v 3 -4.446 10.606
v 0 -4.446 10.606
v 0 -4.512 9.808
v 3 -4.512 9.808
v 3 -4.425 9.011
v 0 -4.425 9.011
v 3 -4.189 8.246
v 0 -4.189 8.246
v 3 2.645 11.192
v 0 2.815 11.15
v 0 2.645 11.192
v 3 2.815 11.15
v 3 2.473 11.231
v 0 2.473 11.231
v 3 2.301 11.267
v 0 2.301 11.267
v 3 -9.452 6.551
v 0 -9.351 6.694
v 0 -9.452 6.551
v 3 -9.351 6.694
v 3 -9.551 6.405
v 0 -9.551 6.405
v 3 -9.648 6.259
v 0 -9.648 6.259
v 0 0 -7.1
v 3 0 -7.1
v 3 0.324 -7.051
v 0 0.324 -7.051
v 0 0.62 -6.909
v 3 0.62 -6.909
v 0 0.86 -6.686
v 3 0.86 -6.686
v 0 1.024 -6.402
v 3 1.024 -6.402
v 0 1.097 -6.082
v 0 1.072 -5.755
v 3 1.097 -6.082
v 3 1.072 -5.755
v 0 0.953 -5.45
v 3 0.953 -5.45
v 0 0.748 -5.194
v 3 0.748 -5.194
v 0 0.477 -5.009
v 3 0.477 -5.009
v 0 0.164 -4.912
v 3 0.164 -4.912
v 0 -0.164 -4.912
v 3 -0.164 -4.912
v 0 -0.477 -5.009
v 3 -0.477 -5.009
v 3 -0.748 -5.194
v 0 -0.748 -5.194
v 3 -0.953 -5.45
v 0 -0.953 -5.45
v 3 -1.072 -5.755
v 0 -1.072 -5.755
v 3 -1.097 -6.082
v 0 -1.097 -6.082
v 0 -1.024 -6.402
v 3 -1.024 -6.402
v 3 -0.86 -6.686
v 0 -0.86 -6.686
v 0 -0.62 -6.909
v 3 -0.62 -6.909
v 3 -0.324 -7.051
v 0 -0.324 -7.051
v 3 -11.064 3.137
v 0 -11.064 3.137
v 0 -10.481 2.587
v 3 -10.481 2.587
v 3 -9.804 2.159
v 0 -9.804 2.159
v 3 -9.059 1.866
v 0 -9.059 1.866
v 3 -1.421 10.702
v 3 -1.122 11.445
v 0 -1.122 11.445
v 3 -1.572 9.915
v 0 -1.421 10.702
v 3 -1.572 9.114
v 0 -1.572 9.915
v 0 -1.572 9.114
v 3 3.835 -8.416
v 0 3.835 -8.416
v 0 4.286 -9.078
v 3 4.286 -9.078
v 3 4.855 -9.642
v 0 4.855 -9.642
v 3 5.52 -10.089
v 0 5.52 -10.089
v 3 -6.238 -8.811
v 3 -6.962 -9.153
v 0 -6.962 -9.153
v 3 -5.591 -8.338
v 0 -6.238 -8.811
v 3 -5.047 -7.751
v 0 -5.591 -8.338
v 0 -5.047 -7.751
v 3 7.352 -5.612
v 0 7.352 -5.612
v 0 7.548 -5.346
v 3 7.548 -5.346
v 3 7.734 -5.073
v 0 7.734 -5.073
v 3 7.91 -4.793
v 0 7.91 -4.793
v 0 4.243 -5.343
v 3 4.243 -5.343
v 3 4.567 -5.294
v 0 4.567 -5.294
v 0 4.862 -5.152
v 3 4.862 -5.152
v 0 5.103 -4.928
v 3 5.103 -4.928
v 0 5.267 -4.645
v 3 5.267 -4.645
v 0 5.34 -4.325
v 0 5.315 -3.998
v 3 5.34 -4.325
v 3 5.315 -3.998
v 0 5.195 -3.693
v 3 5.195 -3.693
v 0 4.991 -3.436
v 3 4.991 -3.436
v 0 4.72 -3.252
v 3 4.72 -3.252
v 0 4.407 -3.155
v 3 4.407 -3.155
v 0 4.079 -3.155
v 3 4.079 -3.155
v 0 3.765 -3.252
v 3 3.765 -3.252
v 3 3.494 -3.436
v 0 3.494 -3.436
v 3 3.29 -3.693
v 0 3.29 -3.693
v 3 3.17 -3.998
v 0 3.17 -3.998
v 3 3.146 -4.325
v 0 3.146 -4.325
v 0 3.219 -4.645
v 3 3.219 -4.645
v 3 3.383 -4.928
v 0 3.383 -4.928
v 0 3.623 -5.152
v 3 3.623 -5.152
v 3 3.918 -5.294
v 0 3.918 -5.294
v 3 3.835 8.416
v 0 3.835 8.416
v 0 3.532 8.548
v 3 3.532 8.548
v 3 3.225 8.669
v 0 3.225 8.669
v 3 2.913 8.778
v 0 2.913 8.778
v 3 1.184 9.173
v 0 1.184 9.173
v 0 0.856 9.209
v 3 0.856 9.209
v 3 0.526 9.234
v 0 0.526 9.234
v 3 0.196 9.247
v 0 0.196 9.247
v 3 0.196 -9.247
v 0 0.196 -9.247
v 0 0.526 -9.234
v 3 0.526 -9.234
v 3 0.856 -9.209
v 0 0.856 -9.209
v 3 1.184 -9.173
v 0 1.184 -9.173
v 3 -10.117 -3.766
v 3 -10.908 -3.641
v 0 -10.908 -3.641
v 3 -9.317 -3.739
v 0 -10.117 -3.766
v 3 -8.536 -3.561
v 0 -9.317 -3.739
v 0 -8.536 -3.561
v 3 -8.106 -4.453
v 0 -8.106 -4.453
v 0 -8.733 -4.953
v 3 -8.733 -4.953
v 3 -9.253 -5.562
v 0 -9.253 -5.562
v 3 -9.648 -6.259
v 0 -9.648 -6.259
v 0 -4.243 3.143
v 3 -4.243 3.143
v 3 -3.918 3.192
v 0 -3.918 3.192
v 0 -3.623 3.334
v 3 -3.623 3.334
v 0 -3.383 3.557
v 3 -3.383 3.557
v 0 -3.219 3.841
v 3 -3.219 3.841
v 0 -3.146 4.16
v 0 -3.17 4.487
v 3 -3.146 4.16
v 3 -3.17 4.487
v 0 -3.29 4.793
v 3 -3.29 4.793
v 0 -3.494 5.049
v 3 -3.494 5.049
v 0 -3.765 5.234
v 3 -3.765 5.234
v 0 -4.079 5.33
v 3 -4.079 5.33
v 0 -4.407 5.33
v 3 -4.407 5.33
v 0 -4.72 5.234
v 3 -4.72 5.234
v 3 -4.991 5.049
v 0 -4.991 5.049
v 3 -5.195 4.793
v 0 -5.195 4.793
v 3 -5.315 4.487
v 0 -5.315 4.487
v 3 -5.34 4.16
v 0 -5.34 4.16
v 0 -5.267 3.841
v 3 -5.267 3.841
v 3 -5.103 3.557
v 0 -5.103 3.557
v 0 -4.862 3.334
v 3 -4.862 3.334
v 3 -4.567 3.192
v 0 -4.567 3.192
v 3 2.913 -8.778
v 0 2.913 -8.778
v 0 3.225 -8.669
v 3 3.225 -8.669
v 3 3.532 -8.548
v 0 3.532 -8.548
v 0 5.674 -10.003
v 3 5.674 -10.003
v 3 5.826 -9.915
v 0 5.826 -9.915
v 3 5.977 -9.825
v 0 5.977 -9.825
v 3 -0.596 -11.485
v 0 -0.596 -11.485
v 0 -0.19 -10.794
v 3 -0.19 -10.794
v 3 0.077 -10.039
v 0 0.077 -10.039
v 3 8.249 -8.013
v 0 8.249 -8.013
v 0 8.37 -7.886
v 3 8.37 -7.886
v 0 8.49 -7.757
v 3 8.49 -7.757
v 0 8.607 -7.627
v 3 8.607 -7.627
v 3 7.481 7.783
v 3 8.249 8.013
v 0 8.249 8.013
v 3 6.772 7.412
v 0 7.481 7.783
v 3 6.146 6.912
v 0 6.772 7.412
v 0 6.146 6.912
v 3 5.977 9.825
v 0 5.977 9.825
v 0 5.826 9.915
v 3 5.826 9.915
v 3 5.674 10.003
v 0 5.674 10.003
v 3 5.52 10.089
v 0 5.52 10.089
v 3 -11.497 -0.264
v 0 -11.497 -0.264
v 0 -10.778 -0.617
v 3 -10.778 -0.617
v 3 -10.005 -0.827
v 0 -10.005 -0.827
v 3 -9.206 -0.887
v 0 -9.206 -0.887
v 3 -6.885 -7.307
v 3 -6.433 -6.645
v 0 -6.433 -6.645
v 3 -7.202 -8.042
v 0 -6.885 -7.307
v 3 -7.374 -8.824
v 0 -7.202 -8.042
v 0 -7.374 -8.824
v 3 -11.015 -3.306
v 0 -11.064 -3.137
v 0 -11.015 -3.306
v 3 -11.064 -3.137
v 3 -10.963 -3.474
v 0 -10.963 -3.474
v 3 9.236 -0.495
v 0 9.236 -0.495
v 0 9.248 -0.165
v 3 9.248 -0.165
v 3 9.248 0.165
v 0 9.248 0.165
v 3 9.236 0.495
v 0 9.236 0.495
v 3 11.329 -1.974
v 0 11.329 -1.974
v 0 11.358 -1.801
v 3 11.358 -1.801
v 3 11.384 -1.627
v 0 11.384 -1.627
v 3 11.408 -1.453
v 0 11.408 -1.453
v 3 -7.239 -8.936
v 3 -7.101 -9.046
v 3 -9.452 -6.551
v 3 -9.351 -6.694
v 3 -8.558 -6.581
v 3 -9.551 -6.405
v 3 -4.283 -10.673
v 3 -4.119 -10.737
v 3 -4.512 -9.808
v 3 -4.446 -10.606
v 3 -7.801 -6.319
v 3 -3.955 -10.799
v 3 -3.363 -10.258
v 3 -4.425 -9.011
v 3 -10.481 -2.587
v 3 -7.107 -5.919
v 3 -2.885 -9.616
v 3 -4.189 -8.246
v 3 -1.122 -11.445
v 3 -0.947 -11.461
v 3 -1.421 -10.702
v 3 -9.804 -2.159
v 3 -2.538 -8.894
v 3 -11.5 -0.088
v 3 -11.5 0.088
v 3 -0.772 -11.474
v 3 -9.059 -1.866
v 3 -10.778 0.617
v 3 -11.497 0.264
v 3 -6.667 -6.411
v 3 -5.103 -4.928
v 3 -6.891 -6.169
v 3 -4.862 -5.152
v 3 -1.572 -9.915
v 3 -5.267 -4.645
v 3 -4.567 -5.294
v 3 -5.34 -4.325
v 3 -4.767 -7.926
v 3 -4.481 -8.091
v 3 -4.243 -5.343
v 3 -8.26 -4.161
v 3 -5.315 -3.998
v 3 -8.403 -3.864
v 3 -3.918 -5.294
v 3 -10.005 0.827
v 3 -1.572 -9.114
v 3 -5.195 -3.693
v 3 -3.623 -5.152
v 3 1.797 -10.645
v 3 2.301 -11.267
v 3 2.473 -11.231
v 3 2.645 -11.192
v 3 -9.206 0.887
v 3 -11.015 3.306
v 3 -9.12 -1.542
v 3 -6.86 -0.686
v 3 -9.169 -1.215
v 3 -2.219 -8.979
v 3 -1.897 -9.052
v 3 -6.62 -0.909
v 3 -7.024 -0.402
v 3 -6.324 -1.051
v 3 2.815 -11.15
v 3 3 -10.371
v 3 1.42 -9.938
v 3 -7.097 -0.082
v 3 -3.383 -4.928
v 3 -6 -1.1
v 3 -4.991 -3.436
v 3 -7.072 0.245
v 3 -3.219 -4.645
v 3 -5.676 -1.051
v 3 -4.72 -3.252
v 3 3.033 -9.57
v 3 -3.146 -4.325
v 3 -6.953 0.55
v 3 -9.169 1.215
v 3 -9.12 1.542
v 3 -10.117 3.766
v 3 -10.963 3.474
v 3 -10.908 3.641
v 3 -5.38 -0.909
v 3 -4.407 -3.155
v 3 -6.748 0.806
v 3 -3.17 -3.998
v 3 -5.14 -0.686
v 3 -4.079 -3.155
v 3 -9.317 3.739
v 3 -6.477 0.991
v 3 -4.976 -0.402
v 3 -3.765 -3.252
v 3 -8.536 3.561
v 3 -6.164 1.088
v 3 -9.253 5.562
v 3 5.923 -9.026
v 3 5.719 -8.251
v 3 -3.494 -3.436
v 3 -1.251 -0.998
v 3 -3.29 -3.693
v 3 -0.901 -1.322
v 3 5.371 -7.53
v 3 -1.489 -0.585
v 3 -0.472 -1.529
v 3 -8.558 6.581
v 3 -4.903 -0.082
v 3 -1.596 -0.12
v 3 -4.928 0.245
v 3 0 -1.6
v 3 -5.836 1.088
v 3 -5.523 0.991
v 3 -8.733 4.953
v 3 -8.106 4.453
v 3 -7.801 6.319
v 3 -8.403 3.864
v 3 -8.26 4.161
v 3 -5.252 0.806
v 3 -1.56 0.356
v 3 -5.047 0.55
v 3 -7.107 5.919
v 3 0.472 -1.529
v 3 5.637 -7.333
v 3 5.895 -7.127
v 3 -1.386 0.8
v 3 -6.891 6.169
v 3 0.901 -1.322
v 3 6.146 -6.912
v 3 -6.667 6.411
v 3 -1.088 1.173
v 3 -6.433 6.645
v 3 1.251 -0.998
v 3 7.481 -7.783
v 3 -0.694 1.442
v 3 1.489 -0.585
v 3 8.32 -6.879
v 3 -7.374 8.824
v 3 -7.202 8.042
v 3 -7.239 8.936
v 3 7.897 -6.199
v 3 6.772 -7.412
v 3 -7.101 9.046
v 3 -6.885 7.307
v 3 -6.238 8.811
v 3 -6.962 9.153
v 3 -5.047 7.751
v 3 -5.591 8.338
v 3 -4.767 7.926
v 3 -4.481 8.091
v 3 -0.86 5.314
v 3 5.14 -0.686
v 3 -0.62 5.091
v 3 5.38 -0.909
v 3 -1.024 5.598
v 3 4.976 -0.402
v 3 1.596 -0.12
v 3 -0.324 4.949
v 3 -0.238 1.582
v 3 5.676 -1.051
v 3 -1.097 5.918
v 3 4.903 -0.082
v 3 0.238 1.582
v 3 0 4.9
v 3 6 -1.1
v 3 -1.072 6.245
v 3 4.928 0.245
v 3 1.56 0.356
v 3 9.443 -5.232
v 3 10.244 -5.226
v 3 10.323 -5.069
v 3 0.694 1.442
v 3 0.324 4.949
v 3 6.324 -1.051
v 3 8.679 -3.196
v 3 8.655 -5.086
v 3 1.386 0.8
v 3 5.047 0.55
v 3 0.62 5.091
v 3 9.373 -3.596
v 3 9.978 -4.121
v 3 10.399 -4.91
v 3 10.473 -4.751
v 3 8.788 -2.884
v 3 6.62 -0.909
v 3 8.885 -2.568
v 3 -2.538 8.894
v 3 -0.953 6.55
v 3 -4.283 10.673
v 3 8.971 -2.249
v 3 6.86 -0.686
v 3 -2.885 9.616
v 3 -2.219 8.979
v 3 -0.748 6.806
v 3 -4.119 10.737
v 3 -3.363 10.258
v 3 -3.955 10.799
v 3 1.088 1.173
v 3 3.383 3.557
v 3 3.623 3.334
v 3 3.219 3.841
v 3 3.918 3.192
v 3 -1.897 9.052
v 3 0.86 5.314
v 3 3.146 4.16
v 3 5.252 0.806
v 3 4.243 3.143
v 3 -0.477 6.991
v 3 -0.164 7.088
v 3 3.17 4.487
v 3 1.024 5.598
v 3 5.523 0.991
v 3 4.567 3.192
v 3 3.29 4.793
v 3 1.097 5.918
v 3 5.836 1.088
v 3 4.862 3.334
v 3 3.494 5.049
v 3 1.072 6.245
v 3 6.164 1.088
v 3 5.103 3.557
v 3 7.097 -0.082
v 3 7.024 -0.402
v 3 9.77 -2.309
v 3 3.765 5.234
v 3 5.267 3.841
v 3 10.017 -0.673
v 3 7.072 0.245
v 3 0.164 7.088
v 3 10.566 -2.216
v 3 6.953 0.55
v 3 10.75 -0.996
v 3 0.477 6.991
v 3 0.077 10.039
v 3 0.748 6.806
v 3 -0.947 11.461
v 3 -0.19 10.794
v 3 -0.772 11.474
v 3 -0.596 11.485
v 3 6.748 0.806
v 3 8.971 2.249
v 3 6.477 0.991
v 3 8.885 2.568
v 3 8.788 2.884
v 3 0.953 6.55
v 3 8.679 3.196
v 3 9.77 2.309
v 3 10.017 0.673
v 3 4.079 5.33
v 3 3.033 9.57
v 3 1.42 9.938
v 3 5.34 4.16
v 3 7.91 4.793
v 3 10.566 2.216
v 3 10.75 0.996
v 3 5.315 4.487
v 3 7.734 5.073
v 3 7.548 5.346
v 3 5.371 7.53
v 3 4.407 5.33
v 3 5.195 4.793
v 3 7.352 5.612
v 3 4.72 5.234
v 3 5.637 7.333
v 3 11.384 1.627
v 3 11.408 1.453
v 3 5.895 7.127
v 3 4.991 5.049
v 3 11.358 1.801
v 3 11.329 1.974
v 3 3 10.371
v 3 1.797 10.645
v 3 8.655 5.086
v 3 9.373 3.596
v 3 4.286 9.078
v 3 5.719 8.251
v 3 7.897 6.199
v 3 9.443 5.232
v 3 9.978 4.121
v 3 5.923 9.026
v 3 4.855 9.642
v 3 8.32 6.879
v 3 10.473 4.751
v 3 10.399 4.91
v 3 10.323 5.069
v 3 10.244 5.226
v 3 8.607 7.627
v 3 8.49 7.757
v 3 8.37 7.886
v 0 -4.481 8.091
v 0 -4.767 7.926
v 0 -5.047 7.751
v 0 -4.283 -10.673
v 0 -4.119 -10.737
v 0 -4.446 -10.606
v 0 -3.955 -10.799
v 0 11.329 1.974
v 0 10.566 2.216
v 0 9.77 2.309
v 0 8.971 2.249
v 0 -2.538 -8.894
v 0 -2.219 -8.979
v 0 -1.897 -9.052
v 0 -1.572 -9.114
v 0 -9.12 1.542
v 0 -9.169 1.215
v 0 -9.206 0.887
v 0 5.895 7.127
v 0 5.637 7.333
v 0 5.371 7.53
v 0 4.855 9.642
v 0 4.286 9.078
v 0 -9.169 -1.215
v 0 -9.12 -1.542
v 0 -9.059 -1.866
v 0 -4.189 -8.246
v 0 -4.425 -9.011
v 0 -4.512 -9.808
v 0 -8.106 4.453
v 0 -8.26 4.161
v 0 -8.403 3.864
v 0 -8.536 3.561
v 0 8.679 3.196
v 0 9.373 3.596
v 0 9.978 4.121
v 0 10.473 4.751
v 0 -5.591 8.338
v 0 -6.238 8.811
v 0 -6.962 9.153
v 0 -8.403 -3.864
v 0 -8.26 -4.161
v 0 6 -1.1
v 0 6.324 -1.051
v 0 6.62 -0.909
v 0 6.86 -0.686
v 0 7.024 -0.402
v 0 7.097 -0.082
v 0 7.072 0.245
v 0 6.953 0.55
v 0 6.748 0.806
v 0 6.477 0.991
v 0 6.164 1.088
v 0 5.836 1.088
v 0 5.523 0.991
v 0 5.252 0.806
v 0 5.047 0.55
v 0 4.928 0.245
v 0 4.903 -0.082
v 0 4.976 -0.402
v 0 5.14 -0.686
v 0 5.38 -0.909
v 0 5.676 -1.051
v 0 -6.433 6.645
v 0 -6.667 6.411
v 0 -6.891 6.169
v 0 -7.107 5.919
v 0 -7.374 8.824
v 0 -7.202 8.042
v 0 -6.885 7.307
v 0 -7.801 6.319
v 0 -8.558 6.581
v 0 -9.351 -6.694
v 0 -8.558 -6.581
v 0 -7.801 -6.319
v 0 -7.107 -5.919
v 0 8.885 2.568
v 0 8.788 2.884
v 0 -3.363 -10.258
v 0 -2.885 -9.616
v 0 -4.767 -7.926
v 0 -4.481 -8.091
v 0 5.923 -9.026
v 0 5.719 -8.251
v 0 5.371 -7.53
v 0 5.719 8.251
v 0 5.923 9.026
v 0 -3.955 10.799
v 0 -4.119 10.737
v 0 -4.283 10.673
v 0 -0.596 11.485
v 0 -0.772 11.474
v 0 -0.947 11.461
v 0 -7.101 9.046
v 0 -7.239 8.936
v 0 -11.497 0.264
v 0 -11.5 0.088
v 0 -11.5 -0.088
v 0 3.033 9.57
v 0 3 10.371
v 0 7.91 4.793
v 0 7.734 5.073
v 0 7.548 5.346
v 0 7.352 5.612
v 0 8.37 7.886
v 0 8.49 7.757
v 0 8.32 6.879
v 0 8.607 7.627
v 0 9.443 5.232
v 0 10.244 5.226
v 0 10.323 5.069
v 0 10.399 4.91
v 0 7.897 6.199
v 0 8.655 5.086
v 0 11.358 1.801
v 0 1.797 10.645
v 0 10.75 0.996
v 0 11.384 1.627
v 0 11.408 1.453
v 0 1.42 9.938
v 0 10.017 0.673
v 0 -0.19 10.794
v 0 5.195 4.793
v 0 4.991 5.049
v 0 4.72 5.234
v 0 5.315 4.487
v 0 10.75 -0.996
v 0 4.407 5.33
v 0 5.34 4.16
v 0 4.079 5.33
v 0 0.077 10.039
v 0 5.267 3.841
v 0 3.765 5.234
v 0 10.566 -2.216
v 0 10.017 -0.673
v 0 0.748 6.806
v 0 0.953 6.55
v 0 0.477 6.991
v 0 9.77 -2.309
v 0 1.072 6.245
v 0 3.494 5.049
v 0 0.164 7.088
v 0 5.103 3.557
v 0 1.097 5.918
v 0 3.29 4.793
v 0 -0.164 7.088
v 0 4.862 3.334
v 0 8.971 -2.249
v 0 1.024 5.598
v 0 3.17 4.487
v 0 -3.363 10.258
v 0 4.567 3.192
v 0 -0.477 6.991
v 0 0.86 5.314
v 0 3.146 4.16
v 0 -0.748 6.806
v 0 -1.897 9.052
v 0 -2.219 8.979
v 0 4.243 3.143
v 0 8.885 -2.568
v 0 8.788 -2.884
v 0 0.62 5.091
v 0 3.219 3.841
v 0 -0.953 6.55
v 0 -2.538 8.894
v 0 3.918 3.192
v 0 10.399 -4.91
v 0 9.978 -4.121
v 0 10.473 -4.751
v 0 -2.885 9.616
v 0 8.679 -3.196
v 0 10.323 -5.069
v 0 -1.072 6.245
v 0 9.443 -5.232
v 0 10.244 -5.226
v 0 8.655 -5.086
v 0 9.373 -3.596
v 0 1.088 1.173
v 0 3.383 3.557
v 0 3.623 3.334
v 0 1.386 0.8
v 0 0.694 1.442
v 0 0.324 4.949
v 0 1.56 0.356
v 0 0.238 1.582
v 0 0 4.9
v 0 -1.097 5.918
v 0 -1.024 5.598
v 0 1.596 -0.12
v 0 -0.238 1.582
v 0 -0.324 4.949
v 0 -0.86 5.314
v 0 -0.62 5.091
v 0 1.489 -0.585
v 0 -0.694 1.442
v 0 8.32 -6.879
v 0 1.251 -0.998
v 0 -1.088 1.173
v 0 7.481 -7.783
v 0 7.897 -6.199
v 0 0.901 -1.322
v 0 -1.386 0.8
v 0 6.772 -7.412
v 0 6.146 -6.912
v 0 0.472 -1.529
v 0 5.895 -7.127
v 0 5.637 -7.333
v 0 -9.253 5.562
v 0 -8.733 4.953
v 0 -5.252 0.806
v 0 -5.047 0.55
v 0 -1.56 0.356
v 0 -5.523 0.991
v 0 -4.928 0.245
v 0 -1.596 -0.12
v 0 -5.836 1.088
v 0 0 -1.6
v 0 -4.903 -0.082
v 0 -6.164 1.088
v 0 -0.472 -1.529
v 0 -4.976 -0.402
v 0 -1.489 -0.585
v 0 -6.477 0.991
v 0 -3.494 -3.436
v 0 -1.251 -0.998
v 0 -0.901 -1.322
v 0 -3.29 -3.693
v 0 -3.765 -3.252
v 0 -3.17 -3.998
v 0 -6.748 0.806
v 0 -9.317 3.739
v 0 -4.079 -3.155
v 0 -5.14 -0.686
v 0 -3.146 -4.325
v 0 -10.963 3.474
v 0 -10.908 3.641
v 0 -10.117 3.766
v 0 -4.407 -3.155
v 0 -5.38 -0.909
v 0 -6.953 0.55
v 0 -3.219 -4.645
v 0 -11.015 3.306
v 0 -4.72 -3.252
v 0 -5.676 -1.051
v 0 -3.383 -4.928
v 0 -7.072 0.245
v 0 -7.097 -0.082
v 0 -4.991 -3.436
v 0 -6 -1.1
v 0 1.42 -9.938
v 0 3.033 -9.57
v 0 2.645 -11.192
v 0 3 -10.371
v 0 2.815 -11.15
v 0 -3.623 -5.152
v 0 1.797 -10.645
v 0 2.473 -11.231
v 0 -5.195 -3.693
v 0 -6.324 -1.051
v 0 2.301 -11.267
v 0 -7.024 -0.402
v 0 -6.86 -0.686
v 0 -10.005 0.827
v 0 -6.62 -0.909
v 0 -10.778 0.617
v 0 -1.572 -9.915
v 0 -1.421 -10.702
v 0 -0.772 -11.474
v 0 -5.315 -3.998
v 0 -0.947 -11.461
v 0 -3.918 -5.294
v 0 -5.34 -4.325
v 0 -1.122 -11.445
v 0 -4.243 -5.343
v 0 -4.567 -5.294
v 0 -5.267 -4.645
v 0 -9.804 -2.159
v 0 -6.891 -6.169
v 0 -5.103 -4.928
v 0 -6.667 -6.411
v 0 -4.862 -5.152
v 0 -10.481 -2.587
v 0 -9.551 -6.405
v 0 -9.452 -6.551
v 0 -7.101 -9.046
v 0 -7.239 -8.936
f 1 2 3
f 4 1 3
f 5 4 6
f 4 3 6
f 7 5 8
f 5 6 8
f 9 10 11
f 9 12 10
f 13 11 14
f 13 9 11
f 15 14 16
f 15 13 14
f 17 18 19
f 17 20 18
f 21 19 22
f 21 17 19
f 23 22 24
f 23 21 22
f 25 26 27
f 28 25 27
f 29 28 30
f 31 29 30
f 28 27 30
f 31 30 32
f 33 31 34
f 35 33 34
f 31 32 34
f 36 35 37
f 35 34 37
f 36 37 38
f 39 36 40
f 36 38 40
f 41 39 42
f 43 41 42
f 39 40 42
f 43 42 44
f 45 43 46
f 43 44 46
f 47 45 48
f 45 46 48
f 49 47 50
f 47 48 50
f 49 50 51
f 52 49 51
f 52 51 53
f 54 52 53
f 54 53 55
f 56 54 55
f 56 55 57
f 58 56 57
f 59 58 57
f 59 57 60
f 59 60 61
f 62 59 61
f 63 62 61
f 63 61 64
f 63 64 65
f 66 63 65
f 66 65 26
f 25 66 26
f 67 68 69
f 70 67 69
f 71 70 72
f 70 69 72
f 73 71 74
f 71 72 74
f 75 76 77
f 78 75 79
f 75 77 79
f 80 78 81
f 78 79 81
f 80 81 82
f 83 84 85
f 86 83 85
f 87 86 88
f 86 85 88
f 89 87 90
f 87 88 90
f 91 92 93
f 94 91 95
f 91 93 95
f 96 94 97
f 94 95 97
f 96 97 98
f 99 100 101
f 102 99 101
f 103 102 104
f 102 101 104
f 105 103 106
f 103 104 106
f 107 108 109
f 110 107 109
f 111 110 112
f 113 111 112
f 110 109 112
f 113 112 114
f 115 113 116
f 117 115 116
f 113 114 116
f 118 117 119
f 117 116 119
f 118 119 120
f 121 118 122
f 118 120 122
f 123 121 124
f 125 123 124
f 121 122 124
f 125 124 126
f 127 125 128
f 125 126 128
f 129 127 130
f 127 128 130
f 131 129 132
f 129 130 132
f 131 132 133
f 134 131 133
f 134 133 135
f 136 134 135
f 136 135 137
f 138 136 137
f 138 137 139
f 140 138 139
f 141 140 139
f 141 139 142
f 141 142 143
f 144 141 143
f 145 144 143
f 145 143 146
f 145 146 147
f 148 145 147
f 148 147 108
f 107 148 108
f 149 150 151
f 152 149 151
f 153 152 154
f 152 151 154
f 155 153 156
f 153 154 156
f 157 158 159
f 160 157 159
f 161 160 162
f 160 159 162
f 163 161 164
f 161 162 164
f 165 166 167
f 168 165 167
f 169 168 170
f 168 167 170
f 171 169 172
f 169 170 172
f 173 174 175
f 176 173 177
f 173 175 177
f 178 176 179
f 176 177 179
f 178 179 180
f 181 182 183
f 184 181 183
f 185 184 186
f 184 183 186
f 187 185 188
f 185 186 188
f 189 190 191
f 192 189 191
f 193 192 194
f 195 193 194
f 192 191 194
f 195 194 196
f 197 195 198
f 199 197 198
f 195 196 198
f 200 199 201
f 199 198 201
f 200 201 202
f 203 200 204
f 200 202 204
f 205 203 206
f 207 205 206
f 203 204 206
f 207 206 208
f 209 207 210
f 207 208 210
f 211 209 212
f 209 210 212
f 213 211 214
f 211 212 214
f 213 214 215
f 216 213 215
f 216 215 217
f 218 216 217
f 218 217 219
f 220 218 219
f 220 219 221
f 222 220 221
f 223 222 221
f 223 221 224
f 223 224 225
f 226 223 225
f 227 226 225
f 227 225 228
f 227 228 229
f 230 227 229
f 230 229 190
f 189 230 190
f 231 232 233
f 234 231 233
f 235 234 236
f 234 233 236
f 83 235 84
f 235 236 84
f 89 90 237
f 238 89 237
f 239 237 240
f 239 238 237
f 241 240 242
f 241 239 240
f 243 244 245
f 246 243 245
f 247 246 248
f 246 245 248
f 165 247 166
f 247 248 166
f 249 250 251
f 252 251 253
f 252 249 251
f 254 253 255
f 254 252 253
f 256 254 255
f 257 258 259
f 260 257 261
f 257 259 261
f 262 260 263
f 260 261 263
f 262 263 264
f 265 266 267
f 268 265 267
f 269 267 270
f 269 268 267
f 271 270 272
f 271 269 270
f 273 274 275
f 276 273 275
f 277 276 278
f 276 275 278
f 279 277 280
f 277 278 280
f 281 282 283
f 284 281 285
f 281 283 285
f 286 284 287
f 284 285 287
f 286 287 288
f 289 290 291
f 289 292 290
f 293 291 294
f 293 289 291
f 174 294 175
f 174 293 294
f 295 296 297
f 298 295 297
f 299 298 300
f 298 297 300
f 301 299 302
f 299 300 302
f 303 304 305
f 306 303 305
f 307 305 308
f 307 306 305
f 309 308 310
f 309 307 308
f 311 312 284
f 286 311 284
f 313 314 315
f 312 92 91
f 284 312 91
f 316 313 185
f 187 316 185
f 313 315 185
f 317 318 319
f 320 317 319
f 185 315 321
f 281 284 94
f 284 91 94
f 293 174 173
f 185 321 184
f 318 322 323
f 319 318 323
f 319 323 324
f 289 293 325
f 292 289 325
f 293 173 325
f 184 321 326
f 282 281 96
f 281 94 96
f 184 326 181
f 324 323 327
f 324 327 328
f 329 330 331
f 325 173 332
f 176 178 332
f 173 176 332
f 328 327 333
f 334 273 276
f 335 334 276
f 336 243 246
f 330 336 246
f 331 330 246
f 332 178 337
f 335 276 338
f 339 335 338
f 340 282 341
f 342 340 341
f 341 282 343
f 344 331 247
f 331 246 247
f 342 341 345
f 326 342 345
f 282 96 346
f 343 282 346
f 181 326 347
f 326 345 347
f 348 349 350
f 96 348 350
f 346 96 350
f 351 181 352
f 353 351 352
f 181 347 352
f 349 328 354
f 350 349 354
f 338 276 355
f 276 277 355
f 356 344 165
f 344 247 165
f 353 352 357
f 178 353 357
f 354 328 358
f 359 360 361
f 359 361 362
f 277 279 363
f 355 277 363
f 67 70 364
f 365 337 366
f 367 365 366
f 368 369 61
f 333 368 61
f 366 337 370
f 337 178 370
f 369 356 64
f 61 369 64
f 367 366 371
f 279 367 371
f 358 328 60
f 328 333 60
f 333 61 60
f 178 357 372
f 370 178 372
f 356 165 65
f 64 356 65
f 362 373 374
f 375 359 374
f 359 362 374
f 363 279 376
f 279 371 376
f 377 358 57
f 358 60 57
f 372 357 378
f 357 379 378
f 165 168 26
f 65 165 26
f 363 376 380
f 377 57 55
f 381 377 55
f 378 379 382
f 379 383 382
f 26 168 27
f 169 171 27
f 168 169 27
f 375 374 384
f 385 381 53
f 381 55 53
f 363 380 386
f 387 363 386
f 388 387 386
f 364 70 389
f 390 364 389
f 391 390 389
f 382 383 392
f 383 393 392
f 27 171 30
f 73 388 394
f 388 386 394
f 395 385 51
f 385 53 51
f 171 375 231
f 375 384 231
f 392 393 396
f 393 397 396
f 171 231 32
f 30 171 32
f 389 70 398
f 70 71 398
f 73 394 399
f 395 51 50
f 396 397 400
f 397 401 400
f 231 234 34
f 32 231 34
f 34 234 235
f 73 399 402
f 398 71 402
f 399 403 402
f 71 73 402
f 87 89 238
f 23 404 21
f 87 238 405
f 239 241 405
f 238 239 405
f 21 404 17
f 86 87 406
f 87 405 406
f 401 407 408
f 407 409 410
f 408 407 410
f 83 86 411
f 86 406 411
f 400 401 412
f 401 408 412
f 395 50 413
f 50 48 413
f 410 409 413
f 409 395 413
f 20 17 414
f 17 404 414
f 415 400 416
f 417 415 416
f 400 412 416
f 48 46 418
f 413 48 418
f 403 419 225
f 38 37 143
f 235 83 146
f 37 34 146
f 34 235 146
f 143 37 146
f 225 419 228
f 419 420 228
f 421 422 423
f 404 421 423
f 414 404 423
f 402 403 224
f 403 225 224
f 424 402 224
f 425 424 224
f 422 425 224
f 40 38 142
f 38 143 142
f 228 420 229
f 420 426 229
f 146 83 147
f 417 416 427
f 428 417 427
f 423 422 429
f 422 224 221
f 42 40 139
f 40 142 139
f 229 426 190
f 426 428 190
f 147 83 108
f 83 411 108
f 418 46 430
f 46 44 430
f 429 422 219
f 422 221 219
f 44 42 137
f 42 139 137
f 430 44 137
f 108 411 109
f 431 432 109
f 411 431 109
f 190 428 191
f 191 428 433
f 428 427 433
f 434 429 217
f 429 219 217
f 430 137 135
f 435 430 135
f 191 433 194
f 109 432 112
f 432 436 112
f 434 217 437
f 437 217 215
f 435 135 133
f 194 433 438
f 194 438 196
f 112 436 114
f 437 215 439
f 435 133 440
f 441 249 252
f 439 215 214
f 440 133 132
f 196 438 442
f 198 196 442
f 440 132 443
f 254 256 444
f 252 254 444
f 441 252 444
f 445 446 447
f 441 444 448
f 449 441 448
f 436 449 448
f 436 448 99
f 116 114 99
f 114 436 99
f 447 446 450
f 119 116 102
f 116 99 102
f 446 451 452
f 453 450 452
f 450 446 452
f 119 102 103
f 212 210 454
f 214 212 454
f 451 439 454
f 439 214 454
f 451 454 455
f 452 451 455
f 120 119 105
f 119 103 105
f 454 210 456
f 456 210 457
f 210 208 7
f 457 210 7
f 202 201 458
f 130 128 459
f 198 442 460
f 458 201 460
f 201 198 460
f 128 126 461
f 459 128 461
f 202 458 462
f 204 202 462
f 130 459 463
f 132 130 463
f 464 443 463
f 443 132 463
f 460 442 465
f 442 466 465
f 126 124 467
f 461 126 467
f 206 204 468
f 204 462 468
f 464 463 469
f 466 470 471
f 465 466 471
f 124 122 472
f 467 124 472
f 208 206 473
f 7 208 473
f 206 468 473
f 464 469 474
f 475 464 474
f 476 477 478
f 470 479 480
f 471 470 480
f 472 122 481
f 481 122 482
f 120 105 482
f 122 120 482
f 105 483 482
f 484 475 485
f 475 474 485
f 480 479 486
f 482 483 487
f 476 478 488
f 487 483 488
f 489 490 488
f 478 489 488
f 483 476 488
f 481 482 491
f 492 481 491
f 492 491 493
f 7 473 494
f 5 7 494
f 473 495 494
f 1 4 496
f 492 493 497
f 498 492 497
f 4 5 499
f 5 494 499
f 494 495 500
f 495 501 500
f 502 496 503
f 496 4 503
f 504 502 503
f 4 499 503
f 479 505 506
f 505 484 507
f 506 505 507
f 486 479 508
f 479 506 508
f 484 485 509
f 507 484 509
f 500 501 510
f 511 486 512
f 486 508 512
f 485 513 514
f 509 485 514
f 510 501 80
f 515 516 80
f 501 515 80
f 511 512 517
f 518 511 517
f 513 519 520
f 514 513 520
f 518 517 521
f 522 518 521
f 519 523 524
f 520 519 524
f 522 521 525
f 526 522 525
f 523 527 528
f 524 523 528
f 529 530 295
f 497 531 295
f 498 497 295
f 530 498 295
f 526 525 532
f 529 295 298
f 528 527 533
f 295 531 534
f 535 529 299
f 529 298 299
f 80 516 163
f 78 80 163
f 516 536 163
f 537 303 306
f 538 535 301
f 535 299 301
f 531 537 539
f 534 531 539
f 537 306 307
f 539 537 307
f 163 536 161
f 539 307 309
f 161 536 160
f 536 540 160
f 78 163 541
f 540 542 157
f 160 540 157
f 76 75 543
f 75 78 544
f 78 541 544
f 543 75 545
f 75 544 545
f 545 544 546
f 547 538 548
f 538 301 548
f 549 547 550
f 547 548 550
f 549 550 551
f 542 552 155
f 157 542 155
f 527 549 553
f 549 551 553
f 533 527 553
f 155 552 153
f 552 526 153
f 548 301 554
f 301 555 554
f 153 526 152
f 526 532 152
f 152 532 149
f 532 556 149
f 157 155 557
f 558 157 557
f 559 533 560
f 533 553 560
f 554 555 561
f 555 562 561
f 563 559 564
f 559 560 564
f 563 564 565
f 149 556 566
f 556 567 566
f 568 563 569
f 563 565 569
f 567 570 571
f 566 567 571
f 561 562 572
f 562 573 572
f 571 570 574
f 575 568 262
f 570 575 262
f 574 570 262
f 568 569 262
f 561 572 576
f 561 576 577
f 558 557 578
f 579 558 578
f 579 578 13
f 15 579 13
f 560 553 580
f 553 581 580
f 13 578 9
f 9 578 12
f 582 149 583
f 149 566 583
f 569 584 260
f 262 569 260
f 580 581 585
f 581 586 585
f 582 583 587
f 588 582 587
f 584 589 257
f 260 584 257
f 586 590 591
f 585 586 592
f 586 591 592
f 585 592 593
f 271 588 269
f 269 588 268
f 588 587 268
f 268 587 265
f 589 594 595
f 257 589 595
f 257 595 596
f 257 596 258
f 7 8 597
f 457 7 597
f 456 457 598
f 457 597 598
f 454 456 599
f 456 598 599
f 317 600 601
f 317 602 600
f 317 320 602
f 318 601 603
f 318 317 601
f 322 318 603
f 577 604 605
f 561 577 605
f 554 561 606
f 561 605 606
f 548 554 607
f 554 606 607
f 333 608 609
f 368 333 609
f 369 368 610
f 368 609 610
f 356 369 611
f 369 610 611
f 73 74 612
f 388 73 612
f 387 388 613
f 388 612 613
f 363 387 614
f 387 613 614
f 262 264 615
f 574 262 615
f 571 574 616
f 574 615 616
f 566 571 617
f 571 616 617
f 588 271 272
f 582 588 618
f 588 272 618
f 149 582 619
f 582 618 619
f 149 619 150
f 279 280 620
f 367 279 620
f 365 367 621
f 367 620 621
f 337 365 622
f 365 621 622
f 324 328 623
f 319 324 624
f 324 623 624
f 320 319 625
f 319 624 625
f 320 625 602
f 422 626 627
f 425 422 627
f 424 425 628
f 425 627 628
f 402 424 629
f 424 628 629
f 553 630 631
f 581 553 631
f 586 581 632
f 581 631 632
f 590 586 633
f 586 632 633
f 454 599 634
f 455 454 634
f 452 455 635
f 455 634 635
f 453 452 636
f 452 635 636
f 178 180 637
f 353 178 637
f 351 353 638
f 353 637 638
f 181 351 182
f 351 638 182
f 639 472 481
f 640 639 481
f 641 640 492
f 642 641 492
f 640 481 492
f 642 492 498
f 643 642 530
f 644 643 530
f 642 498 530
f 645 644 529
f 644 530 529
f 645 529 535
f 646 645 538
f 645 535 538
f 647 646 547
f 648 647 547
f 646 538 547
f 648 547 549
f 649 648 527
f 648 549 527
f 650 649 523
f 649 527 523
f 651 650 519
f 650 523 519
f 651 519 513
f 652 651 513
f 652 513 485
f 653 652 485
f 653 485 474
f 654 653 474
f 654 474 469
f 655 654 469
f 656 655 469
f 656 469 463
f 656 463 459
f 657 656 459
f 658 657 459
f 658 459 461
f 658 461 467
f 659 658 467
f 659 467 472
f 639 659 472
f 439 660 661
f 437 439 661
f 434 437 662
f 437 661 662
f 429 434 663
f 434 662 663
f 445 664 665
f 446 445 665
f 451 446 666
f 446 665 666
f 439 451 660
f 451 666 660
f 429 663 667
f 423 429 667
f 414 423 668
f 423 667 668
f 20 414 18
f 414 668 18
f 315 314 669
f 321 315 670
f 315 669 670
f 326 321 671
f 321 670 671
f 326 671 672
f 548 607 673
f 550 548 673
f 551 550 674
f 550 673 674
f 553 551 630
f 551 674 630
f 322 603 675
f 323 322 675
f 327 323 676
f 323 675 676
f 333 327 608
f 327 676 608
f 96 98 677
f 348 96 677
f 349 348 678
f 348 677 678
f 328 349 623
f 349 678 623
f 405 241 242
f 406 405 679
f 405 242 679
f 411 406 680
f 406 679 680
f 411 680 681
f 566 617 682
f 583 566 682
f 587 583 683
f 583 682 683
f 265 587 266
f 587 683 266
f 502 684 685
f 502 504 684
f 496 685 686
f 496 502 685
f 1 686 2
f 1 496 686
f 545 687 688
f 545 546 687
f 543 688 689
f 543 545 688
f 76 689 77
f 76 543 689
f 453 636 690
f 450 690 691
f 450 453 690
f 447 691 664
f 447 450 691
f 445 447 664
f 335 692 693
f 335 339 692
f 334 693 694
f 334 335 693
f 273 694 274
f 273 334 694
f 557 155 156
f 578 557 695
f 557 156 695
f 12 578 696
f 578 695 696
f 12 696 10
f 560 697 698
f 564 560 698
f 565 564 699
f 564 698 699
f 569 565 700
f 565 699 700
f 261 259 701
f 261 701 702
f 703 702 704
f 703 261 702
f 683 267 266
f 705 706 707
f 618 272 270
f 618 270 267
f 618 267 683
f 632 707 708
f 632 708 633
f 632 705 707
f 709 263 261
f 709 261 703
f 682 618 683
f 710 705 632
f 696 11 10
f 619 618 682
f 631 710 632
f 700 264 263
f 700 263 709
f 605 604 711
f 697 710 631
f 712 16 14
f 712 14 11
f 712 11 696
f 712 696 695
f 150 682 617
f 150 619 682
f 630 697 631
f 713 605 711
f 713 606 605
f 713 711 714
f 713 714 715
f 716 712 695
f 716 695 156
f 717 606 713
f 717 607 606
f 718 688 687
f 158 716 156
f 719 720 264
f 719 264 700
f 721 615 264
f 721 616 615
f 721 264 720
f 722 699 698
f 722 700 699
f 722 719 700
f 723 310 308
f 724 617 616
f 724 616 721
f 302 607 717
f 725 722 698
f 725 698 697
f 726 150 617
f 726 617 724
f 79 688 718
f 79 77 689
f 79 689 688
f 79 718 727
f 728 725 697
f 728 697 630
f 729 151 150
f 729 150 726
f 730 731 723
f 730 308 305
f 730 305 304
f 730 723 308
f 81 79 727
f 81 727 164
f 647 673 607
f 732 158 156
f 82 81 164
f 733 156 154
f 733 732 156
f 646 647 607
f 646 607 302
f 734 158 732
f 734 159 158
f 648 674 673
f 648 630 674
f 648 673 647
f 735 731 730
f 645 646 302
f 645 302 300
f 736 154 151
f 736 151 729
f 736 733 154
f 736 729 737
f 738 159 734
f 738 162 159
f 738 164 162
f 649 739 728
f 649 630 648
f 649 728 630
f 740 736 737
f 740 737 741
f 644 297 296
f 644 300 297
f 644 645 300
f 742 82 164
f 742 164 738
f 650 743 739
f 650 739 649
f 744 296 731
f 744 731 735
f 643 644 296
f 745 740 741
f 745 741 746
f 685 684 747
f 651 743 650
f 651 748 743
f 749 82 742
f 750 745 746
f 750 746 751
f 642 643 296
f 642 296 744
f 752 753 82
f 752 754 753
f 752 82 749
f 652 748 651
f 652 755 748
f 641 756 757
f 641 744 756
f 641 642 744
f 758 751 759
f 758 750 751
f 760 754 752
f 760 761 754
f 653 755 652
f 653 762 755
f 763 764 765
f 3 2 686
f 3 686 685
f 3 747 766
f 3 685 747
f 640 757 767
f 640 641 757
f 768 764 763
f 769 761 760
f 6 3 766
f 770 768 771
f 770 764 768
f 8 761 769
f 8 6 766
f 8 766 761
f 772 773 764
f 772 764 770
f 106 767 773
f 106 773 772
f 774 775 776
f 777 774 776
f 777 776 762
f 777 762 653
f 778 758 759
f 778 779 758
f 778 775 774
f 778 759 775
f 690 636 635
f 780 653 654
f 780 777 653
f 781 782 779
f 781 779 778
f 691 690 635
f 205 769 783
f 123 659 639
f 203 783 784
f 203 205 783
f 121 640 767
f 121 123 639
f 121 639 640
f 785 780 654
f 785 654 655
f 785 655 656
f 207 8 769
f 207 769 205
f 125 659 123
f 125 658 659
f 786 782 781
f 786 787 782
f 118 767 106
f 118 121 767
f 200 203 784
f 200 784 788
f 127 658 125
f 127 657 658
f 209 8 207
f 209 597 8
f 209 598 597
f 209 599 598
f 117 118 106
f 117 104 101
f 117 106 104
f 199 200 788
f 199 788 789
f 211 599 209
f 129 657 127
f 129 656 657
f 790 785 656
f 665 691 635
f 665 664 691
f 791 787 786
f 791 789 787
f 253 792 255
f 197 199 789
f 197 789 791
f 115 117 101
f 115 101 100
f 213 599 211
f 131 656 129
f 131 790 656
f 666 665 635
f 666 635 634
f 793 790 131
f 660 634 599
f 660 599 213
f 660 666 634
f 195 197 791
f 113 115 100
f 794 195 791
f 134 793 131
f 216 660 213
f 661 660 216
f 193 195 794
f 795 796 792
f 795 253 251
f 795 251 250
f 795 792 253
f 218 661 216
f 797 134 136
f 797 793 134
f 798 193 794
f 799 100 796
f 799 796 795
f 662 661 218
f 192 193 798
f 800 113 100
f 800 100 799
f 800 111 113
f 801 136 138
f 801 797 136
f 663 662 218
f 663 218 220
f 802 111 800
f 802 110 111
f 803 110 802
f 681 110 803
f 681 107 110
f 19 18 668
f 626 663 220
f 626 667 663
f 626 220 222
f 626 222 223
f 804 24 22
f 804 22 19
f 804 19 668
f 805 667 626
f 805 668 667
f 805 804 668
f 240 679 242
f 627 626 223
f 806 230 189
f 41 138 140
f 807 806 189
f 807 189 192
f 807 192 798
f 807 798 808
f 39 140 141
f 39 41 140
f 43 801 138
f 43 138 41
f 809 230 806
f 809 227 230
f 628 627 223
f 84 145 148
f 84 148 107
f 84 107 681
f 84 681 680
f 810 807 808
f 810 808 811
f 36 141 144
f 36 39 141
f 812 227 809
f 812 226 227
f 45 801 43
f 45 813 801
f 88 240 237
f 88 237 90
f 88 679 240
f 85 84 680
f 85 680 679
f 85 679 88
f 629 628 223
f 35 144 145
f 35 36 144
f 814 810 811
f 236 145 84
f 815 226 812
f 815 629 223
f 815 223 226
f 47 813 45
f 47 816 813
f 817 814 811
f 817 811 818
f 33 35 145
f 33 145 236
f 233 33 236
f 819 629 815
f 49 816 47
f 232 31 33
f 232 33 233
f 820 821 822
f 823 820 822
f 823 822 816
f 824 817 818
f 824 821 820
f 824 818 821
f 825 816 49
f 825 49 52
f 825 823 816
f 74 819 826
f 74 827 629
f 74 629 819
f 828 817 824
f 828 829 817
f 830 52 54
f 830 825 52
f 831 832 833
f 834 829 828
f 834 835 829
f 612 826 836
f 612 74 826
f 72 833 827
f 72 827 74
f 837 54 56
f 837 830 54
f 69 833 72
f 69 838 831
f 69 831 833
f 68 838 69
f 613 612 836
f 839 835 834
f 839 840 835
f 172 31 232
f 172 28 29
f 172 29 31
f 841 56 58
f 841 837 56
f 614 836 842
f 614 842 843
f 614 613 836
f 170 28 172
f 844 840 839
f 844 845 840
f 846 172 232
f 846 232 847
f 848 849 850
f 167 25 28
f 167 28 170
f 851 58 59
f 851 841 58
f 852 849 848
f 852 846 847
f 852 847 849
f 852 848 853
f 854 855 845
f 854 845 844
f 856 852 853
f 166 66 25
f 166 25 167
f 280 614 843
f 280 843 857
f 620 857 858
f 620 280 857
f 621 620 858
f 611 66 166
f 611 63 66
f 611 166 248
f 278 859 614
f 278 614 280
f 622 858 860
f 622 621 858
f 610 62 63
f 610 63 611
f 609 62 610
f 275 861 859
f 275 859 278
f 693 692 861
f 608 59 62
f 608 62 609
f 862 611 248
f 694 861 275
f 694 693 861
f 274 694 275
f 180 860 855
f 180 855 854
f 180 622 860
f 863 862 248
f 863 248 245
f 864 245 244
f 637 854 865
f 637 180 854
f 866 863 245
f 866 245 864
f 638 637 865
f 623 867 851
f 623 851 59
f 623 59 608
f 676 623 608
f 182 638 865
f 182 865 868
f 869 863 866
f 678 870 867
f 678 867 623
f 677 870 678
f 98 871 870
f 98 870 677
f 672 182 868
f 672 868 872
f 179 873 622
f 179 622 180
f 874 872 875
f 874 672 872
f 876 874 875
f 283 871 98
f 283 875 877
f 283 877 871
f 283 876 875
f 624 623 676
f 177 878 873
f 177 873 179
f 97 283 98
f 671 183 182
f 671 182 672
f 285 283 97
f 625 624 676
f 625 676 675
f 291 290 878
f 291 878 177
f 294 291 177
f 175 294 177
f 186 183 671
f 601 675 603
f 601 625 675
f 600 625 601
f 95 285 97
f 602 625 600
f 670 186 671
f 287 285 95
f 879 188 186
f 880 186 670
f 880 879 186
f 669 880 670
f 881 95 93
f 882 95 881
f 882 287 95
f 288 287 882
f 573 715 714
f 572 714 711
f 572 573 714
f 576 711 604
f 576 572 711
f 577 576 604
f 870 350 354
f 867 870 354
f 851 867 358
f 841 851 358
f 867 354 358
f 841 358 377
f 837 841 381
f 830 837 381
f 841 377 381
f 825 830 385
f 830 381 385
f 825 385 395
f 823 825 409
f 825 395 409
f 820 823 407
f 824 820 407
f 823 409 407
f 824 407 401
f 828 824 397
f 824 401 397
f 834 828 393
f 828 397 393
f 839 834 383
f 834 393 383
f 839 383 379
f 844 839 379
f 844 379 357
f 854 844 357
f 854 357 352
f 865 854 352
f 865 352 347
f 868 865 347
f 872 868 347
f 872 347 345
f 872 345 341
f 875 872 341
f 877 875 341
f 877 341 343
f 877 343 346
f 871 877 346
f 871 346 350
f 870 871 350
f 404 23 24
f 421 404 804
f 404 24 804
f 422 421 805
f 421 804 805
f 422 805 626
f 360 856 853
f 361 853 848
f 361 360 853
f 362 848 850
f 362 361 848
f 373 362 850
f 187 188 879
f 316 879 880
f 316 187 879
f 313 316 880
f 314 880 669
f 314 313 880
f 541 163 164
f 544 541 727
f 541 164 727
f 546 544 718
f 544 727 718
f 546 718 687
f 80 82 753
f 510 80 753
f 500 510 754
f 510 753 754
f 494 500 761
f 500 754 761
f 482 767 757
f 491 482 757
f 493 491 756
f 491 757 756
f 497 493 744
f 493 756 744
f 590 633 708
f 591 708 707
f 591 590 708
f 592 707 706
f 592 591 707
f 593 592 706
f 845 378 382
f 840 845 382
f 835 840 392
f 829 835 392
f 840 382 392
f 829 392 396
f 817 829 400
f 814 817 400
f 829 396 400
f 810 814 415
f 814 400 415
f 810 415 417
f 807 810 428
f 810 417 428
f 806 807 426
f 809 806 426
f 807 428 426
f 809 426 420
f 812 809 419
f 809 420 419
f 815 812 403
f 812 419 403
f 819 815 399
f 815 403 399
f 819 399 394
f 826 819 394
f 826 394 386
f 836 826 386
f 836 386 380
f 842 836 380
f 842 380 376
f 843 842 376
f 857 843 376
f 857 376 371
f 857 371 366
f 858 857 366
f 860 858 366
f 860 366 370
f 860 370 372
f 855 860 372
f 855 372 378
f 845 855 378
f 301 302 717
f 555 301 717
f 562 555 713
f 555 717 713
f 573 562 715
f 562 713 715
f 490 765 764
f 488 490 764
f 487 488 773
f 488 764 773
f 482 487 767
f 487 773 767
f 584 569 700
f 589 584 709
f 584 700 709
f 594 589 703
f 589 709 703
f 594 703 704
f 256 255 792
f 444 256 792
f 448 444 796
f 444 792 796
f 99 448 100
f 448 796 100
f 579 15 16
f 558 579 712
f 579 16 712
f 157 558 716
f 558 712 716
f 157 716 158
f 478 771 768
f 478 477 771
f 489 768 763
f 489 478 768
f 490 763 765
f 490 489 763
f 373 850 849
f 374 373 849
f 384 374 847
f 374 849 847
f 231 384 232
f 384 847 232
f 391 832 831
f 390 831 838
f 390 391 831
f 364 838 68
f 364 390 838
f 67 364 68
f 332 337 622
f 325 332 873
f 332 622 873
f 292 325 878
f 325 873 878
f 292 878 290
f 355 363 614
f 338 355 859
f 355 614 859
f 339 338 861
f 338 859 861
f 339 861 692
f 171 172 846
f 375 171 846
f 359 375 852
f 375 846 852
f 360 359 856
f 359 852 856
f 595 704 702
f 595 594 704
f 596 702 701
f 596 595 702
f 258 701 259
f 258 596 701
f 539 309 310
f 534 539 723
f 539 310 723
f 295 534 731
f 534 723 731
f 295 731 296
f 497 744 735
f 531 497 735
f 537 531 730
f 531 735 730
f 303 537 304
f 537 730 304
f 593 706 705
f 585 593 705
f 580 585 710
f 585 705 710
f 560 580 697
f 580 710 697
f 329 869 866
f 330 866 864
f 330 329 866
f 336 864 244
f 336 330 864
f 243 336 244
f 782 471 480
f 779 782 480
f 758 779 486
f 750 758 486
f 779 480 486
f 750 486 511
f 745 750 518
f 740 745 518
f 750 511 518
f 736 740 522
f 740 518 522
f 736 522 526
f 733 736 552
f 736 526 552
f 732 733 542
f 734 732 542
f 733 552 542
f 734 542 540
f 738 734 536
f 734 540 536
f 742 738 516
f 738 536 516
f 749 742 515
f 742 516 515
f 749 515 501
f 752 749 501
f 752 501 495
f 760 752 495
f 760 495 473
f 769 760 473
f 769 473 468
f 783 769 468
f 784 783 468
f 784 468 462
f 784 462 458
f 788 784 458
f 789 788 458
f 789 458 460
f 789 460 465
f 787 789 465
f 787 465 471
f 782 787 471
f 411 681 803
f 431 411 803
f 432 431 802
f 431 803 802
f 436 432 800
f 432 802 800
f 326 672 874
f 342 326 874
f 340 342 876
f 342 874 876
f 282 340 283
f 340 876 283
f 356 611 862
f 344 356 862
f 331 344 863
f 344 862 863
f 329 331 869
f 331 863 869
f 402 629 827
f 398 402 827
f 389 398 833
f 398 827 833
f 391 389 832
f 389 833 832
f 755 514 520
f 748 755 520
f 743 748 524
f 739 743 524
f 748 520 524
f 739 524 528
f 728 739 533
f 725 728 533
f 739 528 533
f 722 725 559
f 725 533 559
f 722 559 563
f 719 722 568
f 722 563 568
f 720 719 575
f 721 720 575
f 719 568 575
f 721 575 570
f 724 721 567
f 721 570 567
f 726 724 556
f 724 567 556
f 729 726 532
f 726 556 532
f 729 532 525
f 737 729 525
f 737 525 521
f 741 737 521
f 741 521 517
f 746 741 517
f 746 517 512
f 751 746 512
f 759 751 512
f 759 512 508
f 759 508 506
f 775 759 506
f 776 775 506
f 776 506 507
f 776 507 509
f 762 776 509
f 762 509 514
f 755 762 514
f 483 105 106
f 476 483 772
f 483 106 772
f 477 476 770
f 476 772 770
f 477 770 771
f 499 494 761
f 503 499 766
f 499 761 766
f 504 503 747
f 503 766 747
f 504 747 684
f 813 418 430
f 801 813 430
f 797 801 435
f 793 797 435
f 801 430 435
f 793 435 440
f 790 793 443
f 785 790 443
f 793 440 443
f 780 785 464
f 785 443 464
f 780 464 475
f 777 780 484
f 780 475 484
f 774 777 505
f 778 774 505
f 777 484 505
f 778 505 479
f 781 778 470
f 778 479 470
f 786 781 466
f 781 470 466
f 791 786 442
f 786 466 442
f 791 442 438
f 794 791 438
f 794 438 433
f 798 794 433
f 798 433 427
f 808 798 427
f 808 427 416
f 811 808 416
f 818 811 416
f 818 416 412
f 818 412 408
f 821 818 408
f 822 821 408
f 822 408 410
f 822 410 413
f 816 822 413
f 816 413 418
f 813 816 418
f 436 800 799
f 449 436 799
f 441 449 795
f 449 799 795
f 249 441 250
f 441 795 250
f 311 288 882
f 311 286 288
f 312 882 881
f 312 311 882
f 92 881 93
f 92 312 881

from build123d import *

# Parameters (mm, degrees)
BASPROSKE_W         = 3
BASPROSKE_H         = 11.5
TOOTHCUT_DEPTH      = 17.537835409
TEETHCUTS_COUNT     = 21
TEETHCUTS_ANGLE     = 342.857142857
BORSKE_R            = 4
BORE_DEPTH          = 50.0000508
EXTRUDE_START       = -3
SKETCH_1_R          = 4
EXTRUDE_1_DEPTH     = 3
SKETCH_2_R          = 1.6
SKETCH_2_R_2        = 1.1
CUT_EXTRUDE_1_DEPTH = 17.52708436


with BuildPart() as part:
    # BasProSke → Base-Revolve (revolve)
    with BuildSketch(Plane(origin=(0, 0, 0), x_dir=(1, 0, 0), z_dir=(0, 1, 0)), mode=Mode.PRIVATE) as base_revolve_sk:
        with Locations((1.5, 5.75)):
            Rectangle(BASPROSKE_W, BASPROSKE_H)
    revolve(base_revolve_sk.sketch.rotate(Axis((-10, 0, 0), (1, 0, 0)), 180), axis=Axis((-10, 0, 0), (1, 0, 0)))

    # TooCutSke → ToothCut (cut, through all)
    with BuildSketch(Plane(origin=(0, 0, 0), x_dir=(0, 0, -1), z_dir=(1, 0, 0))):
        with BuildLine():
            ThreePointArc((0.49526894, 9.235730057), (0, 9.249), (-0.49526894, 9.235730057))
            ThreePointArc((-0.49526894, 9.235730057), (-0.823521057, 10.404716786), (-1.472455249, 11.430954496))
            ThreePointArc((-1.472455249, 11.430954496), (0, 11.5254), (1.472455249, 11.430954496))
            ThreePointArc((1.472455249, 11.430954496), (0.823521057, 10.404716786), (0.49526894, 9.235730057))
        make_face()
    toothcut = extrude(amount=TOOTHCUT_DEPTH, mode=Mode.SUBTRACT)

    # TeethCuts: ToothCut ×21 about axis
    teethcuts_axis = Axis((-10, 0, 0), (1, 0, 0))
    for i in range(1, TEETHCUTS_COUNT):
        add(toothcut.rotate(teethcuts_axis, i * TEETHCUTS_ANGLE / (TEETHCUTS_COUNT - 1)), mode=Mode.SUBTRACT)

    # BorSke → Bore (cut, symmetric)
    with BuildSketch(Plane(origin=(0, 0, 0), x_dir=(0, 0, -1), z_dir=(1, 0, 0))):
        with Locations(Location((0, 0, 0), (0, 0, 180))):
            Circle(BORSKE_R)
    extrude(amount=BORE_DEPTH, both=True, mode=Mode.SUBTRACT)

    # ｽｹｯﾁ1 → ﾎﾞｽ - 押し出し1 (add)
    with BuildSketch(Plane.ZY.offset(EXTRUDE_START)):
        Circle(SKETCH_1_R)
    extrude(amount=EXTRUDE_1_DEPTH)

    # ｽｹｯﾁ2 → ｶｯﾄ - 押し出し1 (cut, through all)
    with BuildSketch(Plane(origin=(3, 0, 0), x_dir=(0, 0, -1), z_dir=(1, 0, 0))):
        Circle(SKETCH_2_R)
        with Locations((6, 0)):
            Circle(SKETCH_2_R_2)
        with Locations((4.242640687, -4.242640687)):
            Circle(SKETCH_2_R_2)
        with Locations((0, -6)):
            Circle(SKETCH_2_R_2)
        with Locations((-4.242640687, -4.242640687)):
            Circle(SKETCH_2_R_2)
        with Locations((-6, 0)):
            Circle(SKETCH_2_R_2)
        with Locations((-4.242640687, 4.242640687)):
            Circle(SKETCH_2_R_2)
        with Locations((0, 6)):
            Circle(SKETCH_2_R_2)
        with Locations((4.242640687, 4.242640687)):
            Circle(SKETCH_2_R_2)
    extrude(amount=-CUT_EXTRUDE_1_DEPTH, mode=Mode.SUBTRACT)


solid = part.part
